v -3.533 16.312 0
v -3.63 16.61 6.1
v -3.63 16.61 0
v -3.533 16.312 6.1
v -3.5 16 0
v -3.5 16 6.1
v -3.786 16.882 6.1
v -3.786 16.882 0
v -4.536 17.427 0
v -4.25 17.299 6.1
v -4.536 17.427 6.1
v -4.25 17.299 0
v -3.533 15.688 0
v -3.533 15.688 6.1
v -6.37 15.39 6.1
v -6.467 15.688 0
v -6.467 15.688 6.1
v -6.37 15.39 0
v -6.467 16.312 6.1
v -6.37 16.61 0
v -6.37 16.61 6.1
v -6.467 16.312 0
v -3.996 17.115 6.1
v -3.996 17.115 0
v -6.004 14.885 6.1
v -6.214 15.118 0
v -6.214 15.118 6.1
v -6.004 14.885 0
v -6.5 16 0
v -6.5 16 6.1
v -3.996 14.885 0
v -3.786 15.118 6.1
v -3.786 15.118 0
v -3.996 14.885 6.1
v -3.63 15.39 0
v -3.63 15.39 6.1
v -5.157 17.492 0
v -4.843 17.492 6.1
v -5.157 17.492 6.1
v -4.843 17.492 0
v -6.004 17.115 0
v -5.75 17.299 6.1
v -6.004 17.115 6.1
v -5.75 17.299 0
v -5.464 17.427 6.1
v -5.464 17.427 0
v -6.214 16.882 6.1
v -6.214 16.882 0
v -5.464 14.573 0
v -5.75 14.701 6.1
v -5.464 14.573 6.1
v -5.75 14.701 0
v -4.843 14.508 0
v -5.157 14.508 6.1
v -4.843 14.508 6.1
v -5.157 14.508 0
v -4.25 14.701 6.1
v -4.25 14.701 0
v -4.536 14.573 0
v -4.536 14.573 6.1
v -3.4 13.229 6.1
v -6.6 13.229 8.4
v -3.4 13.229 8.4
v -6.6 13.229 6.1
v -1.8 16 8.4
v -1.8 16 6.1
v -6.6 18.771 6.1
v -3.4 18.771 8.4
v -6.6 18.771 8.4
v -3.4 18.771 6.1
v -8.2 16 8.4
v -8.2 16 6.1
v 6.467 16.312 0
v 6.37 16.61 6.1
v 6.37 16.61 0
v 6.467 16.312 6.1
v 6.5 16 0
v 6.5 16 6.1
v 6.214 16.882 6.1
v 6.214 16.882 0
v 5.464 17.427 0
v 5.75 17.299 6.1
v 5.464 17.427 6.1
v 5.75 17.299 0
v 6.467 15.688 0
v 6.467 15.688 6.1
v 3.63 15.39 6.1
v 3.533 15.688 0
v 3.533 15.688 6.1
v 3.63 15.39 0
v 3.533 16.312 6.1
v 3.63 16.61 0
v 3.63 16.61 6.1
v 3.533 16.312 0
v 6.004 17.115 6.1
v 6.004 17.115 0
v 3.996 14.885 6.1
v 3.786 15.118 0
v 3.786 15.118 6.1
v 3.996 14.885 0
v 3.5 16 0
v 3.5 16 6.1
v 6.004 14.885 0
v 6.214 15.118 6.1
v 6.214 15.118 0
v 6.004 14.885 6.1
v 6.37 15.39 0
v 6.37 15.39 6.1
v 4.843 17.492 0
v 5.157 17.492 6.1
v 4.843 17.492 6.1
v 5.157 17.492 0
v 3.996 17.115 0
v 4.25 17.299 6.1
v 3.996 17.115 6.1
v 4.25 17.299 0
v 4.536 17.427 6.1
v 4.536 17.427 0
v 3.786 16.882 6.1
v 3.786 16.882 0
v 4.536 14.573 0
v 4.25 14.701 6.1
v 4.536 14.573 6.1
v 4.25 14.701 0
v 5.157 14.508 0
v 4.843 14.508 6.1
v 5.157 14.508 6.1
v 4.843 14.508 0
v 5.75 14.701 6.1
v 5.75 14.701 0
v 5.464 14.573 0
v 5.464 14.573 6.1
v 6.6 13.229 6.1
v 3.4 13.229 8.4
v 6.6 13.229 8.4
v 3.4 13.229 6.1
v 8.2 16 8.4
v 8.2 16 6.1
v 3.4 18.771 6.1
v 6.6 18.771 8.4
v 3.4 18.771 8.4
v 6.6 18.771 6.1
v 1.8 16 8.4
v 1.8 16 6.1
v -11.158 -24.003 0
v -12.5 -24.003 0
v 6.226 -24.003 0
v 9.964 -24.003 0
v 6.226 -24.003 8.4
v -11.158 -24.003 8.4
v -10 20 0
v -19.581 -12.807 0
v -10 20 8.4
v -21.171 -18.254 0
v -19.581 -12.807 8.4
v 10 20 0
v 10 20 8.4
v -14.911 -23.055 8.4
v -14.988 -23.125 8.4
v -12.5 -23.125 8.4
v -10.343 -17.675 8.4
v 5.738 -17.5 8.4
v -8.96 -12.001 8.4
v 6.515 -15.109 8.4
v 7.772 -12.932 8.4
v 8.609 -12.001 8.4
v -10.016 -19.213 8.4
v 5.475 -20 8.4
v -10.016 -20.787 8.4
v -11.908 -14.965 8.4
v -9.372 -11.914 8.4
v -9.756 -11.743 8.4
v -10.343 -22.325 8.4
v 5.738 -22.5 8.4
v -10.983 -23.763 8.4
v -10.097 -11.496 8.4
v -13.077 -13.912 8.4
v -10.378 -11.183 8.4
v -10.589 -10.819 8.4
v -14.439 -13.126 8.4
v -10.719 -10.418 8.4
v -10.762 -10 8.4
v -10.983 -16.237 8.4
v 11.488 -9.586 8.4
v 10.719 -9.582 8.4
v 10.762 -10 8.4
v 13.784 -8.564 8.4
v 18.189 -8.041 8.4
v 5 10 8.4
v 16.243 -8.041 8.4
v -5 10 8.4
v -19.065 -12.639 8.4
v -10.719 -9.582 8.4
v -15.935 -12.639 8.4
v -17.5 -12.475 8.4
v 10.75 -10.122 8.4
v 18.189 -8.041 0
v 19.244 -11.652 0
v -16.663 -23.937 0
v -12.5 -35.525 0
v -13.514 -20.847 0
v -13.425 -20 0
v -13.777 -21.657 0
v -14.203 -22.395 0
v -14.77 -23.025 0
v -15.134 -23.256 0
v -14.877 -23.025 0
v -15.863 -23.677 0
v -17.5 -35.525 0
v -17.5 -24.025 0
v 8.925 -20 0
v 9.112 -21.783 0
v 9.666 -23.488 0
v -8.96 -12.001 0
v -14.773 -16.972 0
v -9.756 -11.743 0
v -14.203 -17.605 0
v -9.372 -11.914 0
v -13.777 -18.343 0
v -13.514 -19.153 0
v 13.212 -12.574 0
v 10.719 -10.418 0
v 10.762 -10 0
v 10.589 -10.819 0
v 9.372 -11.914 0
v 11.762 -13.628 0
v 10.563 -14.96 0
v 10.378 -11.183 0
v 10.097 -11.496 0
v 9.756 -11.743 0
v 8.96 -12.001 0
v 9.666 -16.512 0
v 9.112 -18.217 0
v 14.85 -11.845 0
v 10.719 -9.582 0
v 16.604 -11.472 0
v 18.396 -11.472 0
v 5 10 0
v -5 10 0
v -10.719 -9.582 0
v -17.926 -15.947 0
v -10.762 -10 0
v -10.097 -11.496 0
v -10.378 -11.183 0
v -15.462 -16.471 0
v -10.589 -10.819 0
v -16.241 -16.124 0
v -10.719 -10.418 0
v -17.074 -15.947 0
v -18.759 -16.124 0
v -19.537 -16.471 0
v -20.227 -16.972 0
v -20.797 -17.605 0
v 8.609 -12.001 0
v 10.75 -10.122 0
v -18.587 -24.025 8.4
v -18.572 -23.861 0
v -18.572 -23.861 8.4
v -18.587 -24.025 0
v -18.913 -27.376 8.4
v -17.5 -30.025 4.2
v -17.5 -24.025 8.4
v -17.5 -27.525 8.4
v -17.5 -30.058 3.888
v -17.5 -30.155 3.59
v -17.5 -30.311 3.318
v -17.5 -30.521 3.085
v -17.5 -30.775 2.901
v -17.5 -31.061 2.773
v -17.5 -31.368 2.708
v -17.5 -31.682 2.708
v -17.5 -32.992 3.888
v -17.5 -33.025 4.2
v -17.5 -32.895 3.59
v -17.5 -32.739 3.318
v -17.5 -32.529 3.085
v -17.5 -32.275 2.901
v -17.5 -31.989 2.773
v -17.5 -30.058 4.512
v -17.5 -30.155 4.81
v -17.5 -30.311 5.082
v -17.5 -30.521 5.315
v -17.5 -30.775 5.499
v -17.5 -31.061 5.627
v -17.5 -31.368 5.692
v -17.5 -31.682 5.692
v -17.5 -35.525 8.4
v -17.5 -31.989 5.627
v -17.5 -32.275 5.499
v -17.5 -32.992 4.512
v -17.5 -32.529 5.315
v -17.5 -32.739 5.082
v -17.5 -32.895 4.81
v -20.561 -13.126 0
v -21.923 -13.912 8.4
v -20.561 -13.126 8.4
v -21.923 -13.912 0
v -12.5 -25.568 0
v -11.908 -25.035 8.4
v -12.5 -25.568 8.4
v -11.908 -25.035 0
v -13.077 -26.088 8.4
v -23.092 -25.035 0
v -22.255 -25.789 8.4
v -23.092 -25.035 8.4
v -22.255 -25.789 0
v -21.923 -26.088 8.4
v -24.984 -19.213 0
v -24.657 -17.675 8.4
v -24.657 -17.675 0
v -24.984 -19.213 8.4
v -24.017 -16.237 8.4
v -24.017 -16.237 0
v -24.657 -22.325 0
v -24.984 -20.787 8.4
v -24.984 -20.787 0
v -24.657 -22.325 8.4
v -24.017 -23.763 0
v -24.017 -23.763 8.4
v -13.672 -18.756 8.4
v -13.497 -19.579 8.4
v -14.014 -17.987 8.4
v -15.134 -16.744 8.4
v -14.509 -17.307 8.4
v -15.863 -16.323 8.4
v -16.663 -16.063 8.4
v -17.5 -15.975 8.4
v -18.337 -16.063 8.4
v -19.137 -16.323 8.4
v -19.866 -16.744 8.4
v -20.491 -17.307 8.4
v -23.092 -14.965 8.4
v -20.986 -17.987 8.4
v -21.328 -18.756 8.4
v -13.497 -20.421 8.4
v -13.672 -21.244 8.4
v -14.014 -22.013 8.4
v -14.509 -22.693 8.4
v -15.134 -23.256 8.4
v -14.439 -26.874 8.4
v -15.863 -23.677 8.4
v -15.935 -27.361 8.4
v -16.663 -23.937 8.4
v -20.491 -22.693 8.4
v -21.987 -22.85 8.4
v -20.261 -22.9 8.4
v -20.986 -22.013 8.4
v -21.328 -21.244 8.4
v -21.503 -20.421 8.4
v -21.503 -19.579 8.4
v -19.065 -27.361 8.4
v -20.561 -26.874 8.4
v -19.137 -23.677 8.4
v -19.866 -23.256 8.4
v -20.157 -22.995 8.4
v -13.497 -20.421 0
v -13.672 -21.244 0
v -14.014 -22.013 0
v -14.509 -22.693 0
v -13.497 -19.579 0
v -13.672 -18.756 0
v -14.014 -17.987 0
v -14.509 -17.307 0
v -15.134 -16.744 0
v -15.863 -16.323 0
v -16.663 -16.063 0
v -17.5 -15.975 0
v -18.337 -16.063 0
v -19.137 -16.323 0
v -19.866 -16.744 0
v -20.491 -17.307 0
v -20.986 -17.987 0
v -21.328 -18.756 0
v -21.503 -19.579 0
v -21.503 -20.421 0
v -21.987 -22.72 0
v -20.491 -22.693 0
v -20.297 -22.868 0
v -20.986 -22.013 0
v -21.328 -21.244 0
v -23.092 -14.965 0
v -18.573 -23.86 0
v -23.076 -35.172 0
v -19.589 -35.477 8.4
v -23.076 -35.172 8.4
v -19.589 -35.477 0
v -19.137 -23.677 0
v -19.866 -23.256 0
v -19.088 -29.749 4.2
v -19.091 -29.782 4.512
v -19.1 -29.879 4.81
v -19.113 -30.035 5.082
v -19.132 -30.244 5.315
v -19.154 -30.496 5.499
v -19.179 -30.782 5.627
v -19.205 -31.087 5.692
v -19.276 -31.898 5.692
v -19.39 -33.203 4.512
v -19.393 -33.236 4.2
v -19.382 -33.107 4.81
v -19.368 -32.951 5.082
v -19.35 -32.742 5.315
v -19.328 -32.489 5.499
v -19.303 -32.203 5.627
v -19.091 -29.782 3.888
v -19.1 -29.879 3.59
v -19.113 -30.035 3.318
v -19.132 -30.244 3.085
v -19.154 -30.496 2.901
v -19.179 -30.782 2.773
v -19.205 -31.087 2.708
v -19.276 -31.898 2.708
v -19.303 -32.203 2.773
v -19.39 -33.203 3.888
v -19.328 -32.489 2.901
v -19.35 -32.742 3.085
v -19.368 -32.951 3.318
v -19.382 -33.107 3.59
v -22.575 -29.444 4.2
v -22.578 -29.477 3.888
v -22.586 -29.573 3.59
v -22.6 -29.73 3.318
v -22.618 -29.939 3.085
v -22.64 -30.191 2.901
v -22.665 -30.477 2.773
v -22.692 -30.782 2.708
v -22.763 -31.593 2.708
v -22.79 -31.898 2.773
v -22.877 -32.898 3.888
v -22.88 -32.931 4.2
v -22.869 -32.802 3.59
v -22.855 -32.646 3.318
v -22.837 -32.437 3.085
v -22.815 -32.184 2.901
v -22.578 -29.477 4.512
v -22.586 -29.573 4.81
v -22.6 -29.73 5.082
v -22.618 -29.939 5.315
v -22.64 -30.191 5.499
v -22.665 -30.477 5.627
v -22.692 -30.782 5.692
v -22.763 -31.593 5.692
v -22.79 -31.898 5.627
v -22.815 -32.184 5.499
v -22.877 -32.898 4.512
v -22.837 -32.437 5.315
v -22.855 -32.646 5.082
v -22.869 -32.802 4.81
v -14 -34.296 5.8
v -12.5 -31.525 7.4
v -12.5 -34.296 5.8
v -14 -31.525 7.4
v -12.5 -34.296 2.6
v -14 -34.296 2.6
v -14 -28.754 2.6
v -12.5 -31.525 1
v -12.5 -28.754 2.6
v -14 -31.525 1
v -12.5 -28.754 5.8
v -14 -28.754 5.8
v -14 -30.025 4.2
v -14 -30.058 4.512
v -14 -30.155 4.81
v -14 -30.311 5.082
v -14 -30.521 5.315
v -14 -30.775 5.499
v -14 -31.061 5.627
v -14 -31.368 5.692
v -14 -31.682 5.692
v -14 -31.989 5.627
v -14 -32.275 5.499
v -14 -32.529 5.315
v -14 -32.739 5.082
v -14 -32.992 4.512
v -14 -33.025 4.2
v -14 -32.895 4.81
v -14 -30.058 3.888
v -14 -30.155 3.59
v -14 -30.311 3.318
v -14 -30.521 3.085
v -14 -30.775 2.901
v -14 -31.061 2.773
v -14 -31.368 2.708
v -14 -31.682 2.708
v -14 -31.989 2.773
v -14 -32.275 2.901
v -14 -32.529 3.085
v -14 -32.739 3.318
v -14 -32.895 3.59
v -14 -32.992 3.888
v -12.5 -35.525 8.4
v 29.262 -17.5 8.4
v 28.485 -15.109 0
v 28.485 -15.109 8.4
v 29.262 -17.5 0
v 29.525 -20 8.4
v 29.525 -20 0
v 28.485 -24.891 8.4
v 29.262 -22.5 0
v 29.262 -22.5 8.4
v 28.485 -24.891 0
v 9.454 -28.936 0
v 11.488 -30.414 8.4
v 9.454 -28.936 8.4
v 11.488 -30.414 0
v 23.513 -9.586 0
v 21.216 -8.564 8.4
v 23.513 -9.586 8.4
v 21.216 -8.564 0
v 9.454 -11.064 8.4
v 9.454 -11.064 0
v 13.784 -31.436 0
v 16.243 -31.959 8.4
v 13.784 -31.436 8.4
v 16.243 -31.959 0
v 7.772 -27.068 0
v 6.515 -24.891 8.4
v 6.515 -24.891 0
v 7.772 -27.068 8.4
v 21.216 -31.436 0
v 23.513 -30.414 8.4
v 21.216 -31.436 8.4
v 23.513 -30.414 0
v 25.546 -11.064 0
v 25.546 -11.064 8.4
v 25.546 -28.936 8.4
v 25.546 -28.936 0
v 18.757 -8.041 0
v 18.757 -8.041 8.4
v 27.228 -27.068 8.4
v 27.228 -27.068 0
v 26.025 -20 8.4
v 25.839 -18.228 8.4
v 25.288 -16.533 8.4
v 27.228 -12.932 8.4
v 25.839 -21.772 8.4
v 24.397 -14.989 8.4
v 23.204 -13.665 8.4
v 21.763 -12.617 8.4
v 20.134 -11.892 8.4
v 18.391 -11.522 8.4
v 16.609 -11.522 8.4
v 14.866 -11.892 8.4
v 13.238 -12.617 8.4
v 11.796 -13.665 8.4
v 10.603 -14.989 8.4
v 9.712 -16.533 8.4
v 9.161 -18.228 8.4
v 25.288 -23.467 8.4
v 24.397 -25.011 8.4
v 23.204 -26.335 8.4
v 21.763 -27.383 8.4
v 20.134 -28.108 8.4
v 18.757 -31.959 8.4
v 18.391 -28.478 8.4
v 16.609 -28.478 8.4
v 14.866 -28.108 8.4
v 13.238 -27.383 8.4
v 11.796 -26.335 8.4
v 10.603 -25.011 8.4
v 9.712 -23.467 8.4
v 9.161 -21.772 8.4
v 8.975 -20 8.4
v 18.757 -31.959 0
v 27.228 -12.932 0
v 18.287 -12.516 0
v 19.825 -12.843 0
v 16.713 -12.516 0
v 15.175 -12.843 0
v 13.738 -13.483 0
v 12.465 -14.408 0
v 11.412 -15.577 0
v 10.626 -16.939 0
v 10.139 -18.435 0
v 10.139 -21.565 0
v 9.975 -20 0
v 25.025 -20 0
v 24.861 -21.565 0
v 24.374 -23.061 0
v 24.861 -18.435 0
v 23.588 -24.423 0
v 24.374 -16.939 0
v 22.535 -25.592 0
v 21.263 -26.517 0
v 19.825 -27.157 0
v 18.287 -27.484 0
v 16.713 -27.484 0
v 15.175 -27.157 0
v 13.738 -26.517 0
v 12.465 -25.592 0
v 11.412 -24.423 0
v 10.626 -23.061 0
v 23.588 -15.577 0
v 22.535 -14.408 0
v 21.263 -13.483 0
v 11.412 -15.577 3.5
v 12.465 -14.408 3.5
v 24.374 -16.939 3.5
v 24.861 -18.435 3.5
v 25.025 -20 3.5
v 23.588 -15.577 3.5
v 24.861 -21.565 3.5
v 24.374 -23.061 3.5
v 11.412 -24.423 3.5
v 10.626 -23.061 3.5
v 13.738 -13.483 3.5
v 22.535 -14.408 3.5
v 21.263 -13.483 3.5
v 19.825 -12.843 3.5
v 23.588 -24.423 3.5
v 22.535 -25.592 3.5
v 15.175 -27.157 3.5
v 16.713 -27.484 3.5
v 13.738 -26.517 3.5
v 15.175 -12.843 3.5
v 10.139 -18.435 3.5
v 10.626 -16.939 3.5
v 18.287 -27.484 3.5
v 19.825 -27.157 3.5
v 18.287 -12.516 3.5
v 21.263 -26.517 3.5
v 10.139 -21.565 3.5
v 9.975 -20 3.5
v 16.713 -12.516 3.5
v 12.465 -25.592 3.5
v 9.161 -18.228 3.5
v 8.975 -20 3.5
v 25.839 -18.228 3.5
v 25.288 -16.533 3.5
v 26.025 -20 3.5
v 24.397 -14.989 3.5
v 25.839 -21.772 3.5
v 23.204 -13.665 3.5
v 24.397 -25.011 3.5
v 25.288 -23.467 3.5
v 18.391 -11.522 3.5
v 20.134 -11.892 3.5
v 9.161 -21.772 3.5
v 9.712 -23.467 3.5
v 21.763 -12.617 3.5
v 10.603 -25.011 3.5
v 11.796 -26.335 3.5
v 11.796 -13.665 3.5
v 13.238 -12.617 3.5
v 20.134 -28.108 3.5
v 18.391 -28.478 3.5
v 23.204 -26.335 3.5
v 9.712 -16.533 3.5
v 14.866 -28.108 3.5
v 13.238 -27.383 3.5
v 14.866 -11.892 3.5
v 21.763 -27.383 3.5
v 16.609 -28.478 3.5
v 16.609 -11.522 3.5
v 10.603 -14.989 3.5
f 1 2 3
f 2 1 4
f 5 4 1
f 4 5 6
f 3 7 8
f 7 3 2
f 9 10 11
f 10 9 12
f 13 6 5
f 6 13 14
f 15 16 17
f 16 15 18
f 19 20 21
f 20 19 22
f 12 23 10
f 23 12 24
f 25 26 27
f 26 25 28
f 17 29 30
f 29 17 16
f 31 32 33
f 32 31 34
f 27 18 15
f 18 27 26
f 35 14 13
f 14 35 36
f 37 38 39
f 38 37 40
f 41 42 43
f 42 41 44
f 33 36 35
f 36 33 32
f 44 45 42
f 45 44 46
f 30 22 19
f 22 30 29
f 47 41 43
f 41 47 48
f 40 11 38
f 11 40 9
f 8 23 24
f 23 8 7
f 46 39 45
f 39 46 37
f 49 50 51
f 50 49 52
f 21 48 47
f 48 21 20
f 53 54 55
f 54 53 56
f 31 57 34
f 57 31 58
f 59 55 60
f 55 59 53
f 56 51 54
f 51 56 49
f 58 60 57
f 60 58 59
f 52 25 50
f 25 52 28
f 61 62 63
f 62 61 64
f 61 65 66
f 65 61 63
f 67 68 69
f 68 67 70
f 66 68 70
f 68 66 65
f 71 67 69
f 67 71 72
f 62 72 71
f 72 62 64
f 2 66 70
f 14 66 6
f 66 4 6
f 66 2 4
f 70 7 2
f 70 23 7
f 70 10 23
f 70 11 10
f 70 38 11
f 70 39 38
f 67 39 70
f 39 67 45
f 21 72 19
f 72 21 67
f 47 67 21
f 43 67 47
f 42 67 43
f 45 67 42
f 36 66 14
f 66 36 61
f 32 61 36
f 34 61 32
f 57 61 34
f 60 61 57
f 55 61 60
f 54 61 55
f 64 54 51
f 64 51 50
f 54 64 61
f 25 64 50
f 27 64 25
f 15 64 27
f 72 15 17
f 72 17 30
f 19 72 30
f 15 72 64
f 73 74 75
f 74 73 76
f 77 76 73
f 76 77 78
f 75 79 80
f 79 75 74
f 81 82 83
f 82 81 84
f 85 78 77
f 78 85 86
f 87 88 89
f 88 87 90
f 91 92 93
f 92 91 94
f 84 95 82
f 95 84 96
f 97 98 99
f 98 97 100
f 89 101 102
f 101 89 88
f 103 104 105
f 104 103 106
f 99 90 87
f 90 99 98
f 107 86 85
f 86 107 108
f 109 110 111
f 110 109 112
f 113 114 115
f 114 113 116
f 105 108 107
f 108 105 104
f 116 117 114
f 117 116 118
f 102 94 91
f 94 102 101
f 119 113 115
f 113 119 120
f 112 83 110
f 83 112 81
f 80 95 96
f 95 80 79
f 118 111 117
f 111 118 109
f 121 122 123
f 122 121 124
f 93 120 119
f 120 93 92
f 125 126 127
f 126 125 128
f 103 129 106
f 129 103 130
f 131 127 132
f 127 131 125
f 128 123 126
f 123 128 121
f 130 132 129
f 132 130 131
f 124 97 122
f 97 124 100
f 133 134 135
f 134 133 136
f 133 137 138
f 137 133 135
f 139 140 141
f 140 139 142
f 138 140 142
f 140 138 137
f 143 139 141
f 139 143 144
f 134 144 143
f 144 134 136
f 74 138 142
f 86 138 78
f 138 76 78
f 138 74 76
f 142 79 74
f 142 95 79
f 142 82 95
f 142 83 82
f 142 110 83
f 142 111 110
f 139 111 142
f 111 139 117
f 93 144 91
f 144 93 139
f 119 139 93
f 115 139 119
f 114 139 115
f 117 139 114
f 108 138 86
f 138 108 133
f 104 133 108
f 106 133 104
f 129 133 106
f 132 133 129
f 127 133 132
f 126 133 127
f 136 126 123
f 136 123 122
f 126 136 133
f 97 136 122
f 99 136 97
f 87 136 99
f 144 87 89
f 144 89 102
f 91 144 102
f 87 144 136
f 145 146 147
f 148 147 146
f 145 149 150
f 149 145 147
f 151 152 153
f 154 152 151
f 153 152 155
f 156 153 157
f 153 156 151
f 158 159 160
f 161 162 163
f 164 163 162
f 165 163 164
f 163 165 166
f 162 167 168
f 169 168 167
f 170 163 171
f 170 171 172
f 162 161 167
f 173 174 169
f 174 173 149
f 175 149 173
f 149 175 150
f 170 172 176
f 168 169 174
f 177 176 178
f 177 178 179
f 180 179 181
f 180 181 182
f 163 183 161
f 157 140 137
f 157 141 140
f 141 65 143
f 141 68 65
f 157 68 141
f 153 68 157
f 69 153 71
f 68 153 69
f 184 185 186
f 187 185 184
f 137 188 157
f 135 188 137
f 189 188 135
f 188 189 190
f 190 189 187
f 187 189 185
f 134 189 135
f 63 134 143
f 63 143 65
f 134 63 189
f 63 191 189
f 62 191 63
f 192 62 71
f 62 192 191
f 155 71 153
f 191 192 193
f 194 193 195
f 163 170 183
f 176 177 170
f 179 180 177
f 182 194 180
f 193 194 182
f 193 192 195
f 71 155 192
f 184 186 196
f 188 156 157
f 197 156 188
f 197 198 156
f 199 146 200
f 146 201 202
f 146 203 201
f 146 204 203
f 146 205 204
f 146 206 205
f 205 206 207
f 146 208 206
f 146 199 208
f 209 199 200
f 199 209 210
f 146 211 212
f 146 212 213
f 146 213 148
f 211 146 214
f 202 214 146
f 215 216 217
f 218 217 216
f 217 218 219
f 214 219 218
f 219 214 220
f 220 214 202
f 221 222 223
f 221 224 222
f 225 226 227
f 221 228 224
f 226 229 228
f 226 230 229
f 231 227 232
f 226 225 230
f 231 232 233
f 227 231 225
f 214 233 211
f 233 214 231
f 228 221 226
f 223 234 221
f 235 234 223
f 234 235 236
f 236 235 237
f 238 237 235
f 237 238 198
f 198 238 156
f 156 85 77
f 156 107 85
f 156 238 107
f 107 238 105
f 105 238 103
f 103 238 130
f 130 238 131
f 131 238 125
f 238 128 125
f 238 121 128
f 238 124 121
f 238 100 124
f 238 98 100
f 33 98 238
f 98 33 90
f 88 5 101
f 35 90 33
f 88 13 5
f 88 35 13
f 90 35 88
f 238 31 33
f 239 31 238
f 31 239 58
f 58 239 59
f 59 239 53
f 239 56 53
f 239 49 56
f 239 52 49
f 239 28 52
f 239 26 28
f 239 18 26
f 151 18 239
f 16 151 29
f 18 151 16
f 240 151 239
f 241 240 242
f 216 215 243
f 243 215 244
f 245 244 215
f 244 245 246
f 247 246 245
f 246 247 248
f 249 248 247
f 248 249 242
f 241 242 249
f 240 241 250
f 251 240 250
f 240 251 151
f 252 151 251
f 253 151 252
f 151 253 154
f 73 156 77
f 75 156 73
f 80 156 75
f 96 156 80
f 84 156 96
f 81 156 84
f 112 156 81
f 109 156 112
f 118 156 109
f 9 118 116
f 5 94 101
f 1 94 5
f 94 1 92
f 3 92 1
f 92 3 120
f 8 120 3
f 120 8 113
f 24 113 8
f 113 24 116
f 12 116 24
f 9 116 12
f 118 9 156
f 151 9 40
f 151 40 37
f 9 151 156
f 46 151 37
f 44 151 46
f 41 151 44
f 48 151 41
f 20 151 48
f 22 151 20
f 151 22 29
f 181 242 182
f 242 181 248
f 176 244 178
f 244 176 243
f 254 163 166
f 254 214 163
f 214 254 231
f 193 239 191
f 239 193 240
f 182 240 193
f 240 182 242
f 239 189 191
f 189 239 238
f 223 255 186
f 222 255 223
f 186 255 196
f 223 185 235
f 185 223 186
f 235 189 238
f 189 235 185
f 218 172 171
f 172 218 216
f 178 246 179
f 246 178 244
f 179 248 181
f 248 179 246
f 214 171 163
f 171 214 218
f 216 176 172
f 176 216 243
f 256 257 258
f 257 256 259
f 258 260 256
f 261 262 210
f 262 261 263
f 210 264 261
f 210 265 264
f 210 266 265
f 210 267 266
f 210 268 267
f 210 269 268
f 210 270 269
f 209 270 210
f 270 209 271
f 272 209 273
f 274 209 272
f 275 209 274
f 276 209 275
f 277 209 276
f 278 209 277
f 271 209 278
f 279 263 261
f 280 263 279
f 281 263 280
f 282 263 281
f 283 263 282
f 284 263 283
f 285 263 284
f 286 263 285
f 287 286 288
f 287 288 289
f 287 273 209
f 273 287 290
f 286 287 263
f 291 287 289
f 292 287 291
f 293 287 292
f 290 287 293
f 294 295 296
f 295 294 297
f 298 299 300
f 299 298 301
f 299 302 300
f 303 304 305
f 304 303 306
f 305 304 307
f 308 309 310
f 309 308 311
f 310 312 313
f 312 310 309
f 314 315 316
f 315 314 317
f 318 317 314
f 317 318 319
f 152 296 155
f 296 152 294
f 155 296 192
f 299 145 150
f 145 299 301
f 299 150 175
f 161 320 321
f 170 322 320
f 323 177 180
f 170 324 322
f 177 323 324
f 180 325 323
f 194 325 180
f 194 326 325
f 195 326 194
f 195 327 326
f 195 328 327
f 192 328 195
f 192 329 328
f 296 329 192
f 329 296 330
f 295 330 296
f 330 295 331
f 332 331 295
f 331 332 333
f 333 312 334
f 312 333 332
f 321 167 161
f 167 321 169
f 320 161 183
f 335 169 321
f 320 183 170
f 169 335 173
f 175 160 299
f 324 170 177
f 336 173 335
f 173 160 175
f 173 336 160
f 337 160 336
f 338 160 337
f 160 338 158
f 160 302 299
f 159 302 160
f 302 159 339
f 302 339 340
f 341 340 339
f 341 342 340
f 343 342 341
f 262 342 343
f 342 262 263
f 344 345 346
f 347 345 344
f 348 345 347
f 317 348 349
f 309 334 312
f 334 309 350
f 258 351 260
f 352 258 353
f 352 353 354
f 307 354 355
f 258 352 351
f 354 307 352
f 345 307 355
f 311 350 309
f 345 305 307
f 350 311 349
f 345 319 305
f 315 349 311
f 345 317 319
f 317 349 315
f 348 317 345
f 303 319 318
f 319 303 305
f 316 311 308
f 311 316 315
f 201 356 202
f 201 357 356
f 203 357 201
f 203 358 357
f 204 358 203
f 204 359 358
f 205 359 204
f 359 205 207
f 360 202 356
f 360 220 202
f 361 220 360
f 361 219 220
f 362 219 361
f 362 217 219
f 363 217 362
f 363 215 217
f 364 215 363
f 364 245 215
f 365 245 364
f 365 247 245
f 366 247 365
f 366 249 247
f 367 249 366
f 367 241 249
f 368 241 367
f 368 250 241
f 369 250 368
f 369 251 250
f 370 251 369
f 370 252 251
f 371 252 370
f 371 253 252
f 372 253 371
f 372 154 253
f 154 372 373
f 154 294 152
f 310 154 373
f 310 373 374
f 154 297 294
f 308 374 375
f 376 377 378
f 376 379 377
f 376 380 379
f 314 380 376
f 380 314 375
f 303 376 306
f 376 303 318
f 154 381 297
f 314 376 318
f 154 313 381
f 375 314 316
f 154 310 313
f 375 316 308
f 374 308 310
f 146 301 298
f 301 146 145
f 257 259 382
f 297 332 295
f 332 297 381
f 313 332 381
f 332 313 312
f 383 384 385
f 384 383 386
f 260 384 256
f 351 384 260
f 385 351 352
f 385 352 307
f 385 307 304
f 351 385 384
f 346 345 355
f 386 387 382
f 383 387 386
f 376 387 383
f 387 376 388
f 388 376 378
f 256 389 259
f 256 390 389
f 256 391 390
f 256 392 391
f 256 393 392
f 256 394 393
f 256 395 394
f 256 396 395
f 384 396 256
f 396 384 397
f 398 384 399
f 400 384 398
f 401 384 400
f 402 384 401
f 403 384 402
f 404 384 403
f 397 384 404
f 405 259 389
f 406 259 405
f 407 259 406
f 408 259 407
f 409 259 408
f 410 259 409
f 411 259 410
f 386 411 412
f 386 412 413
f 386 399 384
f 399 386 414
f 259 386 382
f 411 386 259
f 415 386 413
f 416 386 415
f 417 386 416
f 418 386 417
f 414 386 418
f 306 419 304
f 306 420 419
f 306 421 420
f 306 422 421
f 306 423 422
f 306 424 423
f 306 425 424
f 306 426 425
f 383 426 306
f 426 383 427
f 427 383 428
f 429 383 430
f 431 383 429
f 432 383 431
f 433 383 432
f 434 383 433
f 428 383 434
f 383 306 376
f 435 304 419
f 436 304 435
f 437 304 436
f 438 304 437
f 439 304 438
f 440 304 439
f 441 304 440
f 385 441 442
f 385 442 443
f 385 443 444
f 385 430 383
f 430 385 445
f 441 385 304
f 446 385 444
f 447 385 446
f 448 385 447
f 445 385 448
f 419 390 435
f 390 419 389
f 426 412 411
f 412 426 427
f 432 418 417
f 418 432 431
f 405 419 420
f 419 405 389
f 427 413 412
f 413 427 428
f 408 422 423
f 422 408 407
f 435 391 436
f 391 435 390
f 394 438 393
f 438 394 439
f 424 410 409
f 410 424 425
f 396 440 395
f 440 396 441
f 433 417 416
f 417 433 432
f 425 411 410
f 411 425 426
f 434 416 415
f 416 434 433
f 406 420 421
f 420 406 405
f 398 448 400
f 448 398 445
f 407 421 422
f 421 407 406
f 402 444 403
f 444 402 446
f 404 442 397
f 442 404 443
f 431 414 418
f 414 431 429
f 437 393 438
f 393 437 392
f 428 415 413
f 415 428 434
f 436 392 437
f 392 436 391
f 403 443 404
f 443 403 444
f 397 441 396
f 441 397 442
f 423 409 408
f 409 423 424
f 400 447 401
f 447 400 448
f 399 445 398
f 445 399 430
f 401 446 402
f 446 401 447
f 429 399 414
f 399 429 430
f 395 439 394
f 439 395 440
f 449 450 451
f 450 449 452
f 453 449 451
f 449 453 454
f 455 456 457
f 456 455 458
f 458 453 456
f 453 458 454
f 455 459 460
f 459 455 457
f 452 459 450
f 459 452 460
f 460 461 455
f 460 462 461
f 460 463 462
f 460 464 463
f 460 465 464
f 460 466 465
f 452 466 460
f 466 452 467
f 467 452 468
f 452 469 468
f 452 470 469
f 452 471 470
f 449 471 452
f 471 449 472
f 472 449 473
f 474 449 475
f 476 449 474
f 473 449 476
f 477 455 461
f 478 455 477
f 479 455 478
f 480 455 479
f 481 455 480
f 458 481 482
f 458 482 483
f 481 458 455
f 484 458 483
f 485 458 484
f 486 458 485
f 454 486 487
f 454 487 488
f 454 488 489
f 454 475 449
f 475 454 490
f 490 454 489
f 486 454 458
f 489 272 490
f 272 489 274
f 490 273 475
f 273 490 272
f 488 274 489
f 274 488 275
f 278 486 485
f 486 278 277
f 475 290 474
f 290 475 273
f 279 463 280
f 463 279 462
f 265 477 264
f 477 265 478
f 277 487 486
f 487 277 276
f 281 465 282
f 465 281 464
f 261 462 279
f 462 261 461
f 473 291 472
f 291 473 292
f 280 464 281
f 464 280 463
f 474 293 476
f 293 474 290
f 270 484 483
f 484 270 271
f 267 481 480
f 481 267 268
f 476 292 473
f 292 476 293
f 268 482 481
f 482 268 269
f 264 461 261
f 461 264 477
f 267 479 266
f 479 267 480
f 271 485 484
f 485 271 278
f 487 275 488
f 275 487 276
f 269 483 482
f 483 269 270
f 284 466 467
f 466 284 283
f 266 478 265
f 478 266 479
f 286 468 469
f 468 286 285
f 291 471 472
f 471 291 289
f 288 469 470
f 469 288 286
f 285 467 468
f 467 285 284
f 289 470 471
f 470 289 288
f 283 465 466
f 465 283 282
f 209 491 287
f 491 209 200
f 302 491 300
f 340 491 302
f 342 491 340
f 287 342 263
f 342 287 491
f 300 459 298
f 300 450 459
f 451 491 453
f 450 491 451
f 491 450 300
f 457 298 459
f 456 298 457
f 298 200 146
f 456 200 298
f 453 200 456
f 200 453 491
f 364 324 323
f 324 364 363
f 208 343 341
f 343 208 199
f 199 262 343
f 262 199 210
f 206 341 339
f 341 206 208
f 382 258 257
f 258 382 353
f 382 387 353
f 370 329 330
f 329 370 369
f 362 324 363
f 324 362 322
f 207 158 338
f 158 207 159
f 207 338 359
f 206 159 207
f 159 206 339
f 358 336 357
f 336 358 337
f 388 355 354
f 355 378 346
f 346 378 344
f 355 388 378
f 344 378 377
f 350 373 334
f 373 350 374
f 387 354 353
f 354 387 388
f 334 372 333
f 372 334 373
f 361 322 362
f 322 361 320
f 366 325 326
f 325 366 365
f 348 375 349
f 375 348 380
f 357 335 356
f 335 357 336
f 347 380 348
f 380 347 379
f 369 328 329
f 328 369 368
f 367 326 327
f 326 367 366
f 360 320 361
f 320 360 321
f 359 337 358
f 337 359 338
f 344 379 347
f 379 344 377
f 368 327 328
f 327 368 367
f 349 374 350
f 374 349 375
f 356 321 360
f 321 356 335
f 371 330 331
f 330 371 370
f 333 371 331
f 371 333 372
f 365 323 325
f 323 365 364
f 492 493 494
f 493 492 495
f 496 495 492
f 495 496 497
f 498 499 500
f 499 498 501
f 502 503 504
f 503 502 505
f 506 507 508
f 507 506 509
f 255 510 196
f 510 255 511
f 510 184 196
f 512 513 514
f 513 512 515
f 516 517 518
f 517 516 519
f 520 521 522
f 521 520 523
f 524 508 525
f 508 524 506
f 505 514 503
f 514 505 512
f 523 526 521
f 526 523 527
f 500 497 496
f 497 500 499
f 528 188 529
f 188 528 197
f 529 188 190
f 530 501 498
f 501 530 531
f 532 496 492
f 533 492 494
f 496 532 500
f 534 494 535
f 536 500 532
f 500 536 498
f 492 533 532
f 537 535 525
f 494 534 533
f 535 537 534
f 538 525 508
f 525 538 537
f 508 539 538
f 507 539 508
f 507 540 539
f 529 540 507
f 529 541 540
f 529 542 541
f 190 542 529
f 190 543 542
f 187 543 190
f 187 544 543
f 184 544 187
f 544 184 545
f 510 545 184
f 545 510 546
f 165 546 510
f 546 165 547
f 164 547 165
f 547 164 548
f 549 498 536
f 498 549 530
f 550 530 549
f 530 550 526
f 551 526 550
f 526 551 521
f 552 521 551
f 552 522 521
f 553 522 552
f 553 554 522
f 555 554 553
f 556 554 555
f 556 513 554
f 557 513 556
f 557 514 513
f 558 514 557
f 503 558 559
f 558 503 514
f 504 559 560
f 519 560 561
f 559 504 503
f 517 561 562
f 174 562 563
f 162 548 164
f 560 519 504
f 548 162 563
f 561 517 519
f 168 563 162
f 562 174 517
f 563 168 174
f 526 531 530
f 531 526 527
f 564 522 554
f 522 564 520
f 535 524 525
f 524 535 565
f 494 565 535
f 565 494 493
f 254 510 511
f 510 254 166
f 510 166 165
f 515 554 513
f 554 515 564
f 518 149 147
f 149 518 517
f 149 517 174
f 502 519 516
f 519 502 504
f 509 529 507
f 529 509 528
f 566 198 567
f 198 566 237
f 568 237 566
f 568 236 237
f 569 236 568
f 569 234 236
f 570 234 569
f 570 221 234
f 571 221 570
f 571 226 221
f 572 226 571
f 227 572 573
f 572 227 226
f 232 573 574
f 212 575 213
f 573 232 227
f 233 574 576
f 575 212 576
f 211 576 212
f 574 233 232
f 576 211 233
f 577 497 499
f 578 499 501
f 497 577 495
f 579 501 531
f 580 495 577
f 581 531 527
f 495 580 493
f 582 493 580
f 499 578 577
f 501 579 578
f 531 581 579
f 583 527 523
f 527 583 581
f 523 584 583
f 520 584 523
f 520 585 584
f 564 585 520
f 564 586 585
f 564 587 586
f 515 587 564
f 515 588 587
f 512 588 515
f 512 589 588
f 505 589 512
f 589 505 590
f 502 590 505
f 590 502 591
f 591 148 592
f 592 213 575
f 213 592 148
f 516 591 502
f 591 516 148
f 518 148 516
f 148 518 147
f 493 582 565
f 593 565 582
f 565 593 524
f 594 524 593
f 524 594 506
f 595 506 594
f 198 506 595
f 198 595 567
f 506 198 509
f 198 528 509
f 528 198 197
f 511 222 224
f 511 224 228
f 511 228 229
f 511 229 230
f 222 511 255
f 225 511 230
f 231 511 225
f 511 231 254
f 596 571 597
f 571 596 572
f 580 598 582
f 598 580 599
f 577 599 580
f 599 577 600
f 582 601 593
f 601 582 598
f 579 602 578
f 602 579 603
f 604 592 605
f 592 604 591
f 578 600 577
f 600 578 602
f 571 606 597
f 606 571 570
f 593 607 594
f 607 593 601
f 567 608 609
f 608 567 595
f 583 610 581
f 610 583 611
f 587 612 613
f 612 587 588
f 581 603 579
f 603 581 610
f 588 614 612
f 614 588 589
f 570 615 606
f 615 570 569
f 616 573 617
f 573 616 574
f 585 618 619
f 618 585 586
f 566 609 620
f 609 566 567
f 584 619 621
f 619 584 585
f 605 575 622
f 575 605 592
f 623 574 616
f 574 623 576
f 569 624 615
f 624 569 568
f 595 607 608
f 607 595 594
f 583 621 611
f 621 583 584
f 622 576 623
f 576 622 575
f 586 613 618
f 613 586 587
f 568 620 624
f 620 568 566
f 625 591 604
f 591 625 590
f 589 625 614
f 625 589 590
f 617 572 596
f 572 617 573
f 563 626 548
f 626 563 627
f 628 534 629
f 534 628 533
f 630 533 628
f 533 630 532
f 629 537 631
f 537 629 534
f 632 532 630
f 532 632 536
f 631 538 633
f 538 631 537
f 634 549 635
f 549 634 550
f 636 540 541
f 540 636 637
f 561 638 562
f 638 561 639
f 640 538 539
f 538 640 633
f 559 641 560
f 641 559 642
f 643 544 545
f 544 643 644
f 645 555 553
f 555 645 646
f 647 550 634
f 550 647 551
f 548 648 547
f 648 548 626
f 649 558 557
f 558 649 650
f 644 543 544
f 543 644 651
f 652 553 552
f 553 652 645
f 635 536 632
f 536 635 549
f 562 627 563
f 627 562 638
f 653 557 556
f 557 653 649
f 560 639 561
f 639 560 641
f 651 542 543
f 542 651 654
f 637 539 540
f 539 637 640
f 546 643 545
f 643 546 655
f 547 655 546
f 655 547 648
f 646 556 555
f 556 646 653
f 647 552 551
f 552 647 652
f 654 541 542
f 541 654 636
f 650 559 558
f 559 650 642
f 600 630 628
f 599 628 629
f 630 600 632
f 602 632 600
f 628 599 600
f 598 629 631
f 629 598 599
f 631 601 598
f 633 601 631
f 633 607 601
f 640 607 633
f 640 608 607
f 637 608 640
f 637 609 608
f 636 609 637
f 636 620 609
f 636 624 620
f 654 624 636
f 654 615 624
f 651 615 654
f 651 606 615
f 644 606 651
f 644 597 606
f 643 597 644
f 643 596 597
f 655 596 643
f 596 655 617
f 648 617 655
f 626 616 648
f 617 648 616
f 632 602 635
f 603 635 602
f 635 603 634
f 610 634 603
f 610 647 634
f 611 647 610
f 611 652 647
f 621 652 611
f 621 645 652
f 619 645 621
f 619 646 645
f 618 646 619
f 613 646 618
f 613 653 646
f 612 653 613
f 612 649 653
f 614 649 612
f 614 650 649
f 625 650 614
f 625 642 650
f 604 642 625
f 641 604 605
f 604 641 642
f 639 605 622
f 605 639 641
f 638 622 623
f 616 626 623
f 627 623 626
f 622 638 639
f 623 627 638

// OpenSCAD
// file: rod-clamp.scad
module clampPlates(height,thick,space,angle,holes,holeOffset,screw,nutWidth) {
    h = height;
    l = 1+screw+thick+2*holeOffset;
    translate([-1,0,0]) {
        translate([0,-space,0]) rotate([0,0,-angle]) translate([0,-thick,0]) difference() {
            //clamp screw plate
            cube(size=[l,thick,h]);
            if(holes>0) {
                //screw holes, slightly enlarged because this plate has slop
                for(n=[1:holes]) {
                    hull() {
                        for(i=[-0.25,0.25])
                            translate([1+screw/2+holeOffset+thick+i,-0.05,h/holes/2+(n-1)*h/holes])
                                rotate([-90,0,0]) cylinder(r=screw/2,h=thick+0.1);
                    }
                }
            }
        }
        difference() {
            if(nutWidth>0)
                cube(size=[l,1.5+thick,h]);
            else
                cube(size=[l,thick,h]);
            if(holes>0) {
                for(n=[1:holes]) {
                    translate([1+screw/2+holeOffset+thick,2,h/holes/2+(n-1)*h/holes]) rotate([-90,0,0]) union() {
                        //nut hole
                        if(nutWidth>0) translate([0,0,1.5]) rotate([0,0,30]) cylinder(r=nutWidth/2,h=thick,$fn=6);
                        //screw hole
                        translate([0,0,-2.05]) cylinder(r=screw/2,h=thick+1);
                    }
                }
            }
        }
    }
}

module clamp(diameter,height,thick,space,angle,holes,holeOffset,screw,nutWidth) {
    r=diameter/2;
    h=height;
    s=space;
    a=angle;
    w=screw;
    t=thick;
    translate([0,0,height/2]) difference() {
        union() {
            difference() {
                //body
                cylinder(r=r+t,h=h,center=true);
                //make a cut of the cicurlar clamp body
                translate([r,0,-h/2-0.05]) scale([0.9,1,1]) difference() {
                    hull() clampPlates(h+0.1,t,s,a,0,holeOffset,w,nutWidth);
                    clampPlates(h+0.1,t,s,a,0,holeOffset,w,nutWidth);
                }
            }
            //plates
            translate([r,0,-h/2]) clampPlates(h,t,s,a,holes,holeOffset,w,nutWidth);
        }
        //rod hole
        cylinder(r=r,h=h+0.1,center=true);
    }
}
// main file
use <rod-clamp.scad>
include <MCAD/nuts_and_bolts.scad>

// exportRodClamp=true;
exportHolder=true;

distanceX=35;
distanceY=40;
bearingD = 17.05;
zRodD = 8.05;
rodD=12.75;
thick=3.5;
screw=3;
rodClampLength=20;

nutThick = METRIC_NUT_THICKNESS[screw];
nutWidth = METRIC_NUT_AC_WIDTHS[screw];
zr=zRodD/2+thick;
rr=rodD/2+thick;
br=bearingD/2+thick;
height=nutThick*thick;
clampHoleOffset=2.5;

$fs=0.05;

pos=[
    [0,distanceY/2-rr,height/2],
    [-distanceX/2,-distanceY/2,height/2],
    [distanceX/2,-distanceY/2,height/2]
];

module plateShape() {
    hull() {
        //rod clamp base
        translate(pos[0]) cube(size=[rodClampLength,rr*2,height],center=true);
        //z rod clamp pos
        translate(pos[1]) cylinder(r=zRodD/2,h=height,center=true);
        //z thread clamp pos
        translate(pos[2]) cylinder(r=zRodD/2,h=height,center=true);
    }
}

module plate() {
    difference() {
        plateShape();
        //plate hole
        translate([0,0,-0.05]) scale([0.5,0.5,1.1]) plateShape();
        translate(pos[0]+[0,rr-screw/2-clampHoleOffset,height/2-nutThick+0.1]) union() {
            //rod clamp screw and nut holes
            for(i=[-1,1]) {
                translate([i*rodClampLength/4,0,0]) union() {
                    translate([0,0,-height]) cylinder(r=screw/2,h=height*2);
                    nutHole(screw);
                }
            }
        }
    }
}

module holder() {
    difference() {
        plate();
        translate(pos[1]) cylinder(r=zRodD/2+0.05,h=height+0.1,center=true);
        translate(pos[2]) cylinder(r=bearingD/2+0.05,h=height+0.1,center=true);
    }
    //z rod clamp
    translate(pos[1]+[0,0,-height/2]) rotate([0,0,-90])
        clamp(zRodD,height,thick,1,5,1,clampHoleOffset,screw,nutWidth); 
    //z thread rod holder
    translate(pos[2]) difference() {
        cylinder(r=br,h=height,center=true);
        cylinder(r=bearingD/2-1,h=height+0.1,center=true);
        translate([0,0,thick]) cylinder(r=bearingD/2,h=height,center=true);
    }
}

module rodClamp() {
    clamp(rodD,rodClampLength,thick,1,5,2,clampHoleOffset,screw,0);
}

module assembly() {
    rotate([0,180,0]) {
        holder();
        //rod clamp
        translate([rodClampLength/2,distanceY/2+rr,-thick]) 
            rotate([90,0,-90]) 
                rodClamp();
    }
}

if(exportHolder)
    holder();
else if(exportRodClamp)
    rodClamp();
else
    assembly();
